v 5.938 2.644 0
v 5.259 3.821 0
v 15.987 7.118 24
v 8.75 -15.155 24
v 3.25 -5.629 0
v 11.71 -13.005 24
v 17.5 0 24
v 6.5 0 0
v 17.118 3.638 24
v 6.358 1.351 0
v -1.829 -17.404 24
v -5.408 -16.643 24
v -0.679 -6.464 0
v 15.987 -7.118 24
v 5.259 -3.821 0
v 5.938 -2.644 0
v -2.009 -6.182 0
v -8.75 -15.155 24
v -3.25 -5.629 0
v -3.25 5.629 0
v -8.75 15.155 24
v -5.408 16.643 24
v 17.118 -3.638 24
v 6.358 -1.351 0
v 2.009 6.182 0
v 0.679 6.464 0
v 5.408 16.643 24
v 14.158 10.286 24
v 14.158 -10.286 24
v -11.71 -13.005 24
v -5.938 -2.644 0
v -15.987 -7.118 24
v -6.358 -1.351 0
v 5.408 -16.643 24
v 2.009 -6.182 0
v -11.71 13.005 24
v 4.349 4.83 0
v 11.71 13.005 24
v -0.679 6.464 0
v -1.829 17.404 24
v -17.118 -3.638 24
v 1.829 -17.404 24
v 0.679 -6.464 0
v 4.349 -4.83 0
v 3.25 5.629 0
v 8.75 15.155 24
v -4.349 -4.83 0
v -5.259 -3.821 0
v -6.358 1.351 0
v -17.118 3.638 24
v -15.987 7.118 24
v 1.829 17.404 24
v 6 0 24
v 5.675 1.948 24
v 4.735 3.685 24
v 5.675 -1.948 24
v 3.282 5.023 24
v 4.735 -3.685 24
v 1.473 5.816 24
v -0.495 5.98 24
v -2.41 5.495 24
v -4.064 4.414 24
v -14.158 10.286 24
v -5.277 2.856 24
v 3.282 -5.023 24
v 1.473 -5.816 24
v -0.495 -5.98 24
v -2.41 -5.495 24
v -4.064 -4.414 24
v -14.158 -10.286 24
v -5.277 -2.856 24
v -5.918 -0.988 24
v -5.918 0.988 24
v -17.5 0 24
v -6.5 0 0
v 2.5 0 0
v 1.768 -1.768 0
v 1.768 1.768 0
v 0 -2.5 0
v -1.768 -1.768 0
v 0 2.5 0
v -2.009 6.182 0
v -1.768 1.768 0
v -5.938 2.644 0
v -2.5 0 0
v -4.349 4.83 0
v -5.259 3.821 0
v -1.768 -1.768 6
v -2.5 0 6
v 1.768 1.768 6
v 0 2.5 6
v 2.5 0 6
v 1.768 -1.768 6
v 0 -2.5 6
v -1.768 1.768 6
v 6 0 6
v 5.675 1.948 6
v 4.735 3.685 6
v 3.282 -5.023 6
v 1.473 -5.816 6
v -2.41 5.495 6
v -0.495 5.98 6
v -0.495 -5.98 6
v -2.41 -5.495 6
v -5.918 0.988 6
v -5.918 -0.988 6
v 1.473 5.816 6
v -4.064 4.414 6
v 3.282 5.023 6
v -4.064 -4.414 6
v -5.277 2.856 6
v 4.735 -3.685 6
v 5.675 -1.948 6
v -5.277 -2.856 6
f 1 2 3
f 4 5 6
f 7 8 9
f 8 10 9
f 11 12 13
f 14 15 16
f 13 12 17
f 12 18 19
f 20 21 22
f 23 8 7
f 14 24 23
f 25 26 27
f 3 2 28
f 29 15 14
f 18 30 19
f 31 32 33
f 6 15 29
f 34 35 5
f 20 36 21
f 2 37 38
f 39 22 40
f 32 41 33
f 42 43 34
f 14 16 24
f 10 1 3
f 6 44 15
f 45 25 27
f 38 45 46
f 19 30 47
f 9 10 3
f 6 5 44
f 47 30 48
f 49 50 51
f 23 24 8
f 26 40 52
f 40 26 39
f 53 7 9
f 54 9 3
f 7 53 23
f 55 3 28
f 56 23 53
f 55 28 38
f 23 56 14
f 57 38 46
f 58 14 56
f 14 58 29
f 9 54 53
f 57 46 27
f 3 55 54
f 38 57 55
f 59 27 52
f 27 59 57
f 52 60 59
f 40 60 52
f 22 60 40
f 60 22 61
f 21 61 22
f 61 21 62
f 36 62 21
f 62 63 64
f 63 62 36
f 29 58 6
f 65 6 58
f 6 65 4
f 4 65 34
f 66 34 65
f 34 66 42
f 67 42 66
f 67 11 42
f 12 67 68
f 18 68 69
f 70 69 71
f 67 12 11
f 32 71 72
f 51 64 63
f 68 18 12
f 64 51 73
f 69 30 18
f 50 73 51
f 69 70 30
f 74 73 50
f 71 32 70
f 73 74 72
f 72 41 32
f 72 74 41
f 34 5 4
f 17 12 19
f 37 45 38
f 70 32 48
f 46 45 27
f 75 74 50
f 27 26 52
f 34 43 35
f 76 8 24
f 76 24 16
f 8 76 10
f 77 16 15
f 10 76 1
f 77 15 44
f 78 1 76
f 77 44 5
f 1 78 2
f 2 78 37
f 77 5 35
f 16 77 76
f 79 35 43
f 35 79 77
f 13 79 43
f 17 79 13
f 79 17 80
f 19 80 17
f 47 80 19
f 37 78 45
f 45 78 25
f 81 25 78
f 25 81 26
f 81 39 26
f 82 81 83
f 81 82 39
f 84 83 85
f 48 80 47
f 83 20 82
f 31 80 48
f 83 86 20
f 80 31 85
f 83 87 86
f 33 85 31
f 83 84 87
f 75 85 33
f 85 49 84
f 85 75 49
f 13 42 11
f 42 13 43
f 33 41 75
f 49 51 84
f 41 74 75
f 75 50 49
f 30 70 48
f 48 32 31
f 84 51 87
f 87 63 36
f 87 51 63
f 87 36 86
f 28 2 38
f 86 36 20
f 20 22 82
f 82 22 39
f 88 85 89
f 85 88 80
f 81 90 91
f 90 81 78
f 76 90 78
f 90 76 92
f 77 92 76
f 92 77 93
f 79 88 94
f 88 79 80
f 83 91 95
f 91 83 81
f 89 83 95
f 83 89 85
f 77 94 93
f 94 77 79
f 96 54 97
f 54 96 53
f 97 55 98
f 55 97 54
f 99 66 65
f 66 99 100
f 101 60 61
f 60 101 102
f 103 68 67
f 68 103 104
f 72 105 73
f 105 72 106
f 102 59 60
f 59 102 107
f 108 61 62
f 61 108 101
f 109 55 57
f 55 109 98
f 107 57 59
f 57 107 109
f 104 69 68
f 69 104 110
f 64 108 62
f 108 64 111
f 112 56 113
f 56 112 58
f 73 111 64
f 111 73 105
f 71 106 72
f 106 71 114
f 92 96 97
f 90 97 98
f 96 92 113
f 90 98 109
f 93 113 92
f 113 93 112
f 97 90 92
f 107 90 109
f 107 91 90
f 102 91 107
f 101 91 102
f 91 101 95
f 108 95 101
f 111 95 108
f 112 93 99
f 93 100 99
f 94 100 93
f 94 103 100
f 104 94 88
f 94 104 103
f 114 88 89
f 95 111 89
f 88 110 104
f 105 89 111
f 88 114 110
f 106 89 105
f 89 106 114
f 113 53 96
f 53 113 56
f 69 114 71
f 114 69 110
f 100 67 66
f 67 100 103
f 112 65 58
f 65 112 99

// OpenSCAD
//!OpenSCAD

height = 24;
bottom_radius = 35/2;
top_radius = 13/2;
screw_hole = 5/2;
screw_head = 12/2;
thickness = 6;

difference() {
    cylinder(height, top_radius, bottom_radius);
    cylinder(height*3, r=screw_hole, center=true);
    translate([0, 0, thickness])
    cylinder(height, r=screw_head);
    
    //translate([-bottom_radius, -bottom_radius, 0])
    //cube([bottom_radius, bottom_radius*2, height]);
}
